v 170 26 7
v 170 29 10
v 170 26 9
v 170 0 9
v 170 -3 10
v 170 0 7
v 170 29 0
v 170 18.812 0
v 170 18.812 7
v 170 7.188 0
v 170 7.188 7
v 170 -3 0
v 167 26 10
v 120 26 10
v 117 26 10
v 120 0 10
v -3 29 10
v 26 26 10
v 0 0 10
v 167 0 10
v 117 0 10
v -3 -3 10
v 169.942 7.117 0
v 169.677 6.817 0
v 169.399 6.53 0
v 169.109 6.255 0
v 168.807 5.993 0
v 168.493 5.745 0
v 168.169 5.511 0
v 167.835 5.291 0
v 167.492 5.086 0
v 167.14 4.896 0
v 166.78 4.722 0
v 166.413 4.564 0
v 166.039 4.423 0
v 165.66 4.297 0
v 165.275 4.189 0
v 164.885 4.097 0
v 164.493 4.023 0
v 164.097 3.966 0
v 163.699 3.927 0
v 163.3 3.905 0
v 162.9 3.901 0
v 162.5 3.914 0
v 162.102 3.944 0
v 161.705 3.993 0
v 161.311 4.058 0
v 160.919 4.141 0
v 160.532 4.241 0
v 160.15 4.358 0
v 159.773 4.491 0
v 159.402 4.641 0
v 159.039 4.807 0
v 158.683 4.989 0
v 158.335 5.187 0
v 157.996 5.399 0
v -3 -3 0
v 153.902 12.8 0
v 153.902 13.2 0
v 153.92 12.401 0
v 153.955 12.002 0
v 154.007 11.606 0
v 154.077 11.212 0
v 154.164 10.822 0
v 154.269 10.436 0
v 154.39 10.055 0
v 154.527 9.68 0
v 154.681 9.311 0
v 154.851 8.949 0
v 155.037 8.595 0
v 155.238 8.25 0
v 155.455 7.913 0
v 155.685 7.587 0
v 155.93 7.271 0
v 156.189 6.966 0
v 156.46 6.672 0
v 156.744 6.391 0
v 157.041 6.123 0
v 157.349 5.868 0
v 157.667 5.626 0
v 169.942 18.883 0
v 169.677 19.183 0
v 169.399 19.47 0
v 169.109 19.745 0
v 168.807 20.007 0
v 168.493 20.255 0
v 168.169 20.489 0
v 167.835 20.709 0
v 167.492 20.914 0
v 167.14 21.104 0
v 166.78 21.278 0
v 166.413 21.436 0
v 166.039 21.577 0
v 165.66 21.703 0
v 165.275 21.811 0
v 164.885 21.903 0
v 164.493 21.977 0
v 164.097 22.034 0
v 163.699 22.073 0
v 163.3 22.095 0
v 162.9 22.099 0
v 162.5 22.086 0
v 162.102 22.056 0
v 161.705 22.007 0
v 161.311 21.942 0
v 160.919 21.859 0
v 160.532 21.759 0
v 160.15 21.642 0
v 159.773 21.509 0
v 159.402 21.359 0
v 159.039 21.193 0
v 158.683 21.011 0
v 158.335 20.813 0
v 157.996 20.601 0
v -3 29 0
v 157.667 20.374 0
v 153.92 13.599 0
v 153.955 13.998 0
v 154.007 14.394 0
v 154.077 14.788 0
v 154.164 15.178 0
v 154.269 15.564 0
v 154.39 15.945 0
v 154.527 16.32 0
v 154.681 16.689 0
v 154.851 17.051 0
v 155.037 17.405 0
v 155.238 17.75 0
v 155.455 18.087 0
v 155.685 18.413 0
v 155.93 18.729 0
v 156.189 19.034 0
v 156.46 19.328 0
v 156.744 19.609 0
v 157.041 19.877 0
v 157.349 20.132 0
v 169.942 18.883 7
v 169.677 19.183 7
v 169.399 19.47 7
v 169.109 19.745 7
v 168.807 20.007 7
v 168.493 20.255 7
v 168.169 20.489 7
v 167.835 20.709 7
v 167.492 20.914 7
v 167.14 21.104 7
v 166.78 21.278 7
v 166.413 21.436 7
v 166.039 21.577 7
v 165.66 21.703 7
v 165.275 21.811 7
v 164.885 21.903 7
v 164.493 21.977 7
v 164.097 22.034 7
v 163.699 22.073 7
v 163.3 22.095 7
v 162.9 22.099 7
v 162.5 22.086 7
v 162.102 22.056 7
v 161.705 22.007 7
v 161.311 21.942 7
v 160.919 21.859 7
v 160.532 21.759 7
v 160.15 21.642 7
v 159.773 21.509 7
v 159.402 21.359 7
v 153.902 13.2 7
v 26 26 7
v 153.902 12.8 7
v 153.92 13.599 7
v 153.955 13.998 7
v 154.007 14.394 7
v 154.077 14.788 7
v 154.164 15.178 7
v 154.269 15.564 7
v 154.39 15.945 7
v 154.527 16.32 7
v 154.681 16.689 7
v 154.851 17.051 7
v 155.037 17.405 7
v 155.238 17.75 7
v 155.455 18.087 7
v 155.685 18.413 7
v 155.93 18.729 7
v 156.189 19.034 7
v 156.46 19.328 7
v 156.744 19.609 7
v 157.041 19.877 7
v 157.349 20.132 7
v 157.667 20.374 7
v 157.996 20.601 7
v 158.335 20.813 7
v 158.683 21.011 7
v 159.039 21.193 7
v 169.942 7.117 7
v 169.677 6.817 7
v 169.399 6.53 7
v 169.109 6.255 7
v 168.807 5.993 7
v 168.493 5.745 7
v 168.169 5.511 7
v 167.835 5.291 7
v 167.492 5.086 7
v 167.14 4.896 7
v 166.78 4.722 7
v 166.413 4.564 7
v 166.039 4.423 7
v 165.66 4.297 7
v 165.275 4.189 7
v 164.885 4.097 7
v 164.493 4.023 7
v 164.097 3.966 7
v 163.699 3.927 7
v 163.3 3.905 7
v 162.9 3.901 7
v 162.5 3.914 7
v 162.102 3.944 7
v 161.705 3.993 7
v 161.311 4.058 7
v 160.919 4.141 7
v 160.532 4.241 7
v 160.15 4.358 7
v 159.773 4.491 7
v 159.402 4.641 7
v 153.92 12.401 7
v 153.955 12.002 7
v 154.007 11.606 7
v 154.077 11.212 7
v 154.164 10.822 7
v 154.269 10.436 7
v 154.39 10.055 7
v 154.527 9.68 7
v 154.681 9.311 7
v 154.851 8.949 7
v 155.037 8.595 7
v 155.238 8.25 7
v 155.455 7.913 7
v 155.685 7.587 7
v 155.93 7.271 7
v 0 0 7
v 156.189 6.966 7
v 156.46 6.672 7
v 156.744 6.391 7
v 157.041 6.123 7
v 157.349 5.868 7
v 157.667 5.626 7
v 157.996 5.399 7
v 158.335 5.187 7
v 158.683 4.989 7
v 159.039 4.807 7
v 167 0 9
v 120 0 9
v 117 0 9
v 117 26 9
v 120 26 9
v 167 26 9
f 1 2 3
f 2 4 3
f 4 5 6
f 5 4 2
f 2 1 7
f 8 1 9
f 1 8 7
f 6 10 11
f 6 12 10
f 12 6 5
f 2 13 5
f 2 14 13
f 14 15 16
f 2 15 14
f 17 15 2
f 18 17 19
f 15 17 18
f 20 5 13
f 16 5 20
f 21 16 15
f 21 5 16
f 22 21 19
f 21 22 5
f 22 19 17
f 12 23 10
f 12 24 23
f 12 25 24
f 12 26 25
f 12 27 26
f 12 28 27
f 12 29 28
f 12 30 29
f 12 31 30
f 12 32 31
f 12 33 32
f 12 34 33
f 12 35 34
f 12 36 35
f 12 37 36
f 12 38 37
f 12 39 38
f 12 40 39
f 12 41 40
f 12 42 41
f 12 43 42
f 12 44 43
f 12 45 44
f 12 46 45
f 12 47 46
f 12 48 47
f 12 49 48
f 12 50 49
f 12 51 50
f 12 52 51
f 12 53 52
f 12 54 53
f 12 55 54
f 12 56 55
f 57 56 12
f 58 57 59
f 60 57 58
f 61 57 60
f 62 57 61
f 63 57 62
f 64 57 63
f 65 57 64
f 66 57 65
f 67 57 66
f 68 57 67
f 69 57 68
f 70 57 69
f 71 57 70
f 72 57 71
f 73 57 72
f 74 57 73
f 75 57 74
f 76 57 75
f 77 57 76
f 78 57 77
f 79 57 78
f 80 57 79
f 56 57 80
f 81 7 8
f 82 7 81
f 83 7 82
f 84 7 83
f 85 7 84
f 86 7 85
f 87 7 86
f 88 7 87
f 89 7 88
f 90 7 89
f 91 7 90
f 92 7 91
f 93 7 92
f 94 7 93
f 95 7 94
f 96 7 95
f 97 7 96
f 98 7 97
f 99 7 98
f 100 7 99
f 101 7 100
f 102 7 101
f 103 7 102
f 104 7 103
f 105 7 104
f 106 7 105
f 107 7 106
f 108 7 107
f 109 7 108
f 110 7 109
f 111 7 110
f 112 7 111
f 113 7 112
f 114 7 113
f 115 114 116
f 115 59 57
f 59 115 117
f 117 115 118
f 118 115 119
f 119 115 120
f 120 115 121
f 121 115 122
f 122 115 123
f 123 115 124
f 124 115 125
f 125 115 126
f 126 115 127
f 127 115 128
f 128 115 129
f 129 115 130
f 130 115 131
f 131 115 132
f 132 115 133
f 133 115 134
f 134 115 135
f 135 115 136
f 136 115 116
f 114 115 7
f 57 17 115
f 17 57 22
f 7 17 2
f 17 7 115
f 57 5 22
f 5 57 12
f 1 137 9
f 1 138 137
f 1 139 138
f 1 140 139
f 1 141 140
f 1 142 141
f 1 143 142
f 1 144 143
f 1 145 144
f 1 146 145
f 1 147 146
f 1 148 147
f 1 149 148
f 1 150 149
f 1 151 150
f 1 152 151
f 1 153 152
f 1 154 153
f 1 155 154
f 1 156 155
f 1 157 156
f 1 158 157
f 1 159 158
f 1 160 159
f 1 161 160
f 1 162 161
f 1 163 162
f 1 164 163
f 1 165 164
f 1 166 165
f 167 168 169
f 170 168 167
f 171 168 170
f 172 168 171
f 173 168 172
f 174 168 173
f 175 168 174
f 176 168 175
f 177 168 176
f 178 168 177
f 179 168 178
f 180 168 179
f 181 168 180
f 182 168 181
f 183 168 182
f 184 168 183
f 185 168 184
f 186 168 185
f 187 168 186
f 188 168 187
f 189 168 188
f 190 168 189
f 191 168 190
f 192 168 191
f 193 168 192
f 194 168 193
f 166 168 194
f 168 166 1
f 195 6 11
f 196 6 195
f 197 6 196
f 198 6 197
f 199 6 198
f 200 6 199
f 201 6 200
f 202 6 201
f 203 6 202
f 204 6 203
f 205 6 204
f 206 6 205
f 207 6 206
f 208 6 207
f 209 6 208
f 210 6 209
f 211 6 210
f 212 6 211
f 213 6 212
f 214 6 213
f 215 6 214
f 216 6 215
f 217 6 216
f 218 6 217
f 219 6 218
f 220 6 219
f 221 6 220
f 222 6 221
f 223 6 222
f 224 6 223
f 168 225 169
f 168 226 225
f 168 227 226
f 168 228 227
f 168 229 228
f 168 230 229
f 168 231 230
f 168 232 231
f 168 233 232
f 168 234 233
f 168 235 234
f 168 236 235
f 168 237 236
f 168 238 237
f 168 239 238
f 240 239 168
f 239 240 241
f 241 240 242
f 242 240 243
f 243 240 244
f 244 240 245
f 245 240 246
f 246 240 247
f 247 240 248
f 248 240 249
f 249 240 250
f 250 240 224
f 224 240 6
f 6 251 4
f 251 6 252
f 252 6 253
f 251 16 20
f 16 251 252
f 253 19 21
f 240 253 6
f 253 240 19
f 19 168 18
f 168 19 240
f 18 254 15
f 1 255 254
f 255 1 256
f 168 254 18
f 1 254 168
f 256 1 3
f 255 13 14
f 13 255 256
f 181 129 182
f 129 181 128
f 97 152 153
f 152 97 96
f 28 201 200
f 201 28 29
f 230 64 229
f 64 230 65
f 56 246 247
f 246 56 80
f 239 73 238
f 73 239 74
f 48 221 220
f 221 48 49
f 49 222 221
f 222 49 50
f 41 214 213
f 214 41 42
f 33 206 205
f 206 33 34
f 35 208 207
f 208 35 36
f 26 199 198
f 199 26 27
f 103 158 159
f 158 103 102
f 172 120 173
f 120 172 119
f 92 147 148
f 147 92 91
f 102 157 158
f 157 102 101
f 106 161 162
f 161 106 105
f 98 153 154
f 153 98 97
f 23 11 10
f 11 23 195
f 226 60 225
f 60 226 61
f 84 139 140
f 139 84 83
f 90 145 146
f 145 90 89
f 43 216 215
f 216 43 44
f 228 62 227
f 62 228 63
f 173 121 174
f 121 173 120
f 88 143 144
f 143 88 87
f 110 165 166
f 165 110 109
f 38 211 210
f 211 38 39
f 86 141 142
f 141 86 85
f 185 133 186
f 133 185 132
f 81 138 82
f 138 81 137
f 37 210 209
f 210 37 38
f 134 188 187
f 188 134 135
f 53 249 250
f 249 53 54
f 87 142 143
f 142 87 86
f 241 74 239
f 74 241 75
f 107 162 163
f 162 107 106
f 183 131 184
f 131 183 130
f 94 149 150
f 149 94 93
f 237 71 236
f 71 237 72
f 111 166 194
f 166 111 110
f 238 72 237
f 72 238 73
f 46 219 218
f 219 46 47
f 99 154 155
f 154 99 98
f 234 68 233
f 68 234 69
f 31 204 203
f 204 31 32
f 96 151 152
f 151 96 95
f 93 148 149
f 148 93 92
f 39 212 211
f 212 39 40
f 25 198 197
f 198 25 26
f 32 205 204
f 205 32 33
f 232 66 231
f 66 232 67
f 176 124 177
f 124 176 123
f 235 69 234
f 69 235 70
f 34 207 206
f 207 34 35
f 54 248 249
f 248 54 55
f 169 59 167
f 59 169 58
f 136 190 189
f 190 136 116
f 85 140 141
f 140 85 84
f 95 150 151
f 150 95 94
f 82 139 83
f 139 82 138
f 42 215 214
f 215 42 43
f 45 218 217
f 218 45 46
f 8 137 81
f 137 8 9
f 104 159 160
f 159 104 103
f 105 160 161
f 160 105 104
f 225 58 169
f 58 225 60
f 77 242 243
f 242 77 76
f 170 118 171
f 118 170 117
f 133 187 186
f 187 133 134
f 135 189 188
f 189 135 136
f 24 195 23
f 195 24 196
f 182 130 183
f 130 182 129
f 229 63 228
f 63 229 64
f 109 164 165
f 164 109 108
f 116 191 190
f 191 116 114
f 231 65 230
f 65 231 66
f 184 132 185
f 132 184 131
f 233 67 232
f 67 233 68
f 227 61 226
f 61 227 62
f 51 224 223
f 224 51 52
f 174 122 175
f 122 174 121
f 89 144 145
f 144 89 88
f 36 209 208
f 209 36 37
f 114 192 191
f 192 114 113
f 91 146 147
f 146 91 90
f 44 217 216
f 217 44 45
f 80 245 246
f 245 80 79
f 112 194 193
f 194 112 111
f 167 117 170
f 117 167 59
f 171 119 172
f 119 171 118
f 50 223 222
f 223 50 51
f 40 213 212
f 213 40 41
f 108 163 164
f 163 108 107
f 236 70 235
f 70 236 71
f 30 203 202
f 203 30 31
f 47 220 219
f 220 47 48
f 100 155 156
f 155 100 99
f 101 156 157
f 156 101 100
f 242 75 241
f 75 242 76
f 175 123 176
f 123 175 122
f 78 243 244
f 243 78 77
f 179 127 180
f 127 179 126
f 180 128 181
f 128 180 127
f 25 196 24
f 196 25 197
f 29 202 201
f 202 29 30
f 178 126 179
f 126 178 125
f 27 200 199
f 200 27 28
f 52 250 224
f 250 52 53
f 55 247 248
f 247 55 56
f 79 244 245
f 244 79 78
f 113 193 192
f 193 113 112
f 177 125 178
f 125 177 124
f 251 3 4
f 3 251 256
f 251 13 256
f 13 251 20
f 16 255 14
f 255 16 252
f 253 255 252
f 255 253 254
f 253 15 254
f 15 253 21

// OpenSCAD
$fa = 1;
$fs = 0.4;

width = 26;
height = 170;
holeDiameter = 18.2;
thickness = 3;
metalStandThickness = 7;

difference () {
    // тело линейки
    color("green")
    translate([-thickness, -thickness, 0])
    cube([height + thickness, width + 2 * thickness, thickness + metalStandThickness]);
    
    // вырез под ленточку
    points = [
        [0, 0],
        [height, 0],
        [height, width],
        [width, width]
    ];

    // вырез под ленточку
    translate([0, 0, metalStandThickness])
    linear_extrude(height = thickness)
        polygon(points);
        
    // отверстие под наковальню
    translate([height - 7, width/2, 0])
    cylinder(metalStandThickness, d = holeDiameter);
}

// прижималка 1
pressThickness = 3;
color("red")
translate([height - pressThickness, 0, metalStandThickness + thickness - 1]) {
    cube([pressThickness, width, 1]);
}

// прижималка 2
color("red")
translate([height - pressThickness - 50, 0, metalStandThickness + thickness - 1]) {
    cube([pressThickness, width, 1]);
}
